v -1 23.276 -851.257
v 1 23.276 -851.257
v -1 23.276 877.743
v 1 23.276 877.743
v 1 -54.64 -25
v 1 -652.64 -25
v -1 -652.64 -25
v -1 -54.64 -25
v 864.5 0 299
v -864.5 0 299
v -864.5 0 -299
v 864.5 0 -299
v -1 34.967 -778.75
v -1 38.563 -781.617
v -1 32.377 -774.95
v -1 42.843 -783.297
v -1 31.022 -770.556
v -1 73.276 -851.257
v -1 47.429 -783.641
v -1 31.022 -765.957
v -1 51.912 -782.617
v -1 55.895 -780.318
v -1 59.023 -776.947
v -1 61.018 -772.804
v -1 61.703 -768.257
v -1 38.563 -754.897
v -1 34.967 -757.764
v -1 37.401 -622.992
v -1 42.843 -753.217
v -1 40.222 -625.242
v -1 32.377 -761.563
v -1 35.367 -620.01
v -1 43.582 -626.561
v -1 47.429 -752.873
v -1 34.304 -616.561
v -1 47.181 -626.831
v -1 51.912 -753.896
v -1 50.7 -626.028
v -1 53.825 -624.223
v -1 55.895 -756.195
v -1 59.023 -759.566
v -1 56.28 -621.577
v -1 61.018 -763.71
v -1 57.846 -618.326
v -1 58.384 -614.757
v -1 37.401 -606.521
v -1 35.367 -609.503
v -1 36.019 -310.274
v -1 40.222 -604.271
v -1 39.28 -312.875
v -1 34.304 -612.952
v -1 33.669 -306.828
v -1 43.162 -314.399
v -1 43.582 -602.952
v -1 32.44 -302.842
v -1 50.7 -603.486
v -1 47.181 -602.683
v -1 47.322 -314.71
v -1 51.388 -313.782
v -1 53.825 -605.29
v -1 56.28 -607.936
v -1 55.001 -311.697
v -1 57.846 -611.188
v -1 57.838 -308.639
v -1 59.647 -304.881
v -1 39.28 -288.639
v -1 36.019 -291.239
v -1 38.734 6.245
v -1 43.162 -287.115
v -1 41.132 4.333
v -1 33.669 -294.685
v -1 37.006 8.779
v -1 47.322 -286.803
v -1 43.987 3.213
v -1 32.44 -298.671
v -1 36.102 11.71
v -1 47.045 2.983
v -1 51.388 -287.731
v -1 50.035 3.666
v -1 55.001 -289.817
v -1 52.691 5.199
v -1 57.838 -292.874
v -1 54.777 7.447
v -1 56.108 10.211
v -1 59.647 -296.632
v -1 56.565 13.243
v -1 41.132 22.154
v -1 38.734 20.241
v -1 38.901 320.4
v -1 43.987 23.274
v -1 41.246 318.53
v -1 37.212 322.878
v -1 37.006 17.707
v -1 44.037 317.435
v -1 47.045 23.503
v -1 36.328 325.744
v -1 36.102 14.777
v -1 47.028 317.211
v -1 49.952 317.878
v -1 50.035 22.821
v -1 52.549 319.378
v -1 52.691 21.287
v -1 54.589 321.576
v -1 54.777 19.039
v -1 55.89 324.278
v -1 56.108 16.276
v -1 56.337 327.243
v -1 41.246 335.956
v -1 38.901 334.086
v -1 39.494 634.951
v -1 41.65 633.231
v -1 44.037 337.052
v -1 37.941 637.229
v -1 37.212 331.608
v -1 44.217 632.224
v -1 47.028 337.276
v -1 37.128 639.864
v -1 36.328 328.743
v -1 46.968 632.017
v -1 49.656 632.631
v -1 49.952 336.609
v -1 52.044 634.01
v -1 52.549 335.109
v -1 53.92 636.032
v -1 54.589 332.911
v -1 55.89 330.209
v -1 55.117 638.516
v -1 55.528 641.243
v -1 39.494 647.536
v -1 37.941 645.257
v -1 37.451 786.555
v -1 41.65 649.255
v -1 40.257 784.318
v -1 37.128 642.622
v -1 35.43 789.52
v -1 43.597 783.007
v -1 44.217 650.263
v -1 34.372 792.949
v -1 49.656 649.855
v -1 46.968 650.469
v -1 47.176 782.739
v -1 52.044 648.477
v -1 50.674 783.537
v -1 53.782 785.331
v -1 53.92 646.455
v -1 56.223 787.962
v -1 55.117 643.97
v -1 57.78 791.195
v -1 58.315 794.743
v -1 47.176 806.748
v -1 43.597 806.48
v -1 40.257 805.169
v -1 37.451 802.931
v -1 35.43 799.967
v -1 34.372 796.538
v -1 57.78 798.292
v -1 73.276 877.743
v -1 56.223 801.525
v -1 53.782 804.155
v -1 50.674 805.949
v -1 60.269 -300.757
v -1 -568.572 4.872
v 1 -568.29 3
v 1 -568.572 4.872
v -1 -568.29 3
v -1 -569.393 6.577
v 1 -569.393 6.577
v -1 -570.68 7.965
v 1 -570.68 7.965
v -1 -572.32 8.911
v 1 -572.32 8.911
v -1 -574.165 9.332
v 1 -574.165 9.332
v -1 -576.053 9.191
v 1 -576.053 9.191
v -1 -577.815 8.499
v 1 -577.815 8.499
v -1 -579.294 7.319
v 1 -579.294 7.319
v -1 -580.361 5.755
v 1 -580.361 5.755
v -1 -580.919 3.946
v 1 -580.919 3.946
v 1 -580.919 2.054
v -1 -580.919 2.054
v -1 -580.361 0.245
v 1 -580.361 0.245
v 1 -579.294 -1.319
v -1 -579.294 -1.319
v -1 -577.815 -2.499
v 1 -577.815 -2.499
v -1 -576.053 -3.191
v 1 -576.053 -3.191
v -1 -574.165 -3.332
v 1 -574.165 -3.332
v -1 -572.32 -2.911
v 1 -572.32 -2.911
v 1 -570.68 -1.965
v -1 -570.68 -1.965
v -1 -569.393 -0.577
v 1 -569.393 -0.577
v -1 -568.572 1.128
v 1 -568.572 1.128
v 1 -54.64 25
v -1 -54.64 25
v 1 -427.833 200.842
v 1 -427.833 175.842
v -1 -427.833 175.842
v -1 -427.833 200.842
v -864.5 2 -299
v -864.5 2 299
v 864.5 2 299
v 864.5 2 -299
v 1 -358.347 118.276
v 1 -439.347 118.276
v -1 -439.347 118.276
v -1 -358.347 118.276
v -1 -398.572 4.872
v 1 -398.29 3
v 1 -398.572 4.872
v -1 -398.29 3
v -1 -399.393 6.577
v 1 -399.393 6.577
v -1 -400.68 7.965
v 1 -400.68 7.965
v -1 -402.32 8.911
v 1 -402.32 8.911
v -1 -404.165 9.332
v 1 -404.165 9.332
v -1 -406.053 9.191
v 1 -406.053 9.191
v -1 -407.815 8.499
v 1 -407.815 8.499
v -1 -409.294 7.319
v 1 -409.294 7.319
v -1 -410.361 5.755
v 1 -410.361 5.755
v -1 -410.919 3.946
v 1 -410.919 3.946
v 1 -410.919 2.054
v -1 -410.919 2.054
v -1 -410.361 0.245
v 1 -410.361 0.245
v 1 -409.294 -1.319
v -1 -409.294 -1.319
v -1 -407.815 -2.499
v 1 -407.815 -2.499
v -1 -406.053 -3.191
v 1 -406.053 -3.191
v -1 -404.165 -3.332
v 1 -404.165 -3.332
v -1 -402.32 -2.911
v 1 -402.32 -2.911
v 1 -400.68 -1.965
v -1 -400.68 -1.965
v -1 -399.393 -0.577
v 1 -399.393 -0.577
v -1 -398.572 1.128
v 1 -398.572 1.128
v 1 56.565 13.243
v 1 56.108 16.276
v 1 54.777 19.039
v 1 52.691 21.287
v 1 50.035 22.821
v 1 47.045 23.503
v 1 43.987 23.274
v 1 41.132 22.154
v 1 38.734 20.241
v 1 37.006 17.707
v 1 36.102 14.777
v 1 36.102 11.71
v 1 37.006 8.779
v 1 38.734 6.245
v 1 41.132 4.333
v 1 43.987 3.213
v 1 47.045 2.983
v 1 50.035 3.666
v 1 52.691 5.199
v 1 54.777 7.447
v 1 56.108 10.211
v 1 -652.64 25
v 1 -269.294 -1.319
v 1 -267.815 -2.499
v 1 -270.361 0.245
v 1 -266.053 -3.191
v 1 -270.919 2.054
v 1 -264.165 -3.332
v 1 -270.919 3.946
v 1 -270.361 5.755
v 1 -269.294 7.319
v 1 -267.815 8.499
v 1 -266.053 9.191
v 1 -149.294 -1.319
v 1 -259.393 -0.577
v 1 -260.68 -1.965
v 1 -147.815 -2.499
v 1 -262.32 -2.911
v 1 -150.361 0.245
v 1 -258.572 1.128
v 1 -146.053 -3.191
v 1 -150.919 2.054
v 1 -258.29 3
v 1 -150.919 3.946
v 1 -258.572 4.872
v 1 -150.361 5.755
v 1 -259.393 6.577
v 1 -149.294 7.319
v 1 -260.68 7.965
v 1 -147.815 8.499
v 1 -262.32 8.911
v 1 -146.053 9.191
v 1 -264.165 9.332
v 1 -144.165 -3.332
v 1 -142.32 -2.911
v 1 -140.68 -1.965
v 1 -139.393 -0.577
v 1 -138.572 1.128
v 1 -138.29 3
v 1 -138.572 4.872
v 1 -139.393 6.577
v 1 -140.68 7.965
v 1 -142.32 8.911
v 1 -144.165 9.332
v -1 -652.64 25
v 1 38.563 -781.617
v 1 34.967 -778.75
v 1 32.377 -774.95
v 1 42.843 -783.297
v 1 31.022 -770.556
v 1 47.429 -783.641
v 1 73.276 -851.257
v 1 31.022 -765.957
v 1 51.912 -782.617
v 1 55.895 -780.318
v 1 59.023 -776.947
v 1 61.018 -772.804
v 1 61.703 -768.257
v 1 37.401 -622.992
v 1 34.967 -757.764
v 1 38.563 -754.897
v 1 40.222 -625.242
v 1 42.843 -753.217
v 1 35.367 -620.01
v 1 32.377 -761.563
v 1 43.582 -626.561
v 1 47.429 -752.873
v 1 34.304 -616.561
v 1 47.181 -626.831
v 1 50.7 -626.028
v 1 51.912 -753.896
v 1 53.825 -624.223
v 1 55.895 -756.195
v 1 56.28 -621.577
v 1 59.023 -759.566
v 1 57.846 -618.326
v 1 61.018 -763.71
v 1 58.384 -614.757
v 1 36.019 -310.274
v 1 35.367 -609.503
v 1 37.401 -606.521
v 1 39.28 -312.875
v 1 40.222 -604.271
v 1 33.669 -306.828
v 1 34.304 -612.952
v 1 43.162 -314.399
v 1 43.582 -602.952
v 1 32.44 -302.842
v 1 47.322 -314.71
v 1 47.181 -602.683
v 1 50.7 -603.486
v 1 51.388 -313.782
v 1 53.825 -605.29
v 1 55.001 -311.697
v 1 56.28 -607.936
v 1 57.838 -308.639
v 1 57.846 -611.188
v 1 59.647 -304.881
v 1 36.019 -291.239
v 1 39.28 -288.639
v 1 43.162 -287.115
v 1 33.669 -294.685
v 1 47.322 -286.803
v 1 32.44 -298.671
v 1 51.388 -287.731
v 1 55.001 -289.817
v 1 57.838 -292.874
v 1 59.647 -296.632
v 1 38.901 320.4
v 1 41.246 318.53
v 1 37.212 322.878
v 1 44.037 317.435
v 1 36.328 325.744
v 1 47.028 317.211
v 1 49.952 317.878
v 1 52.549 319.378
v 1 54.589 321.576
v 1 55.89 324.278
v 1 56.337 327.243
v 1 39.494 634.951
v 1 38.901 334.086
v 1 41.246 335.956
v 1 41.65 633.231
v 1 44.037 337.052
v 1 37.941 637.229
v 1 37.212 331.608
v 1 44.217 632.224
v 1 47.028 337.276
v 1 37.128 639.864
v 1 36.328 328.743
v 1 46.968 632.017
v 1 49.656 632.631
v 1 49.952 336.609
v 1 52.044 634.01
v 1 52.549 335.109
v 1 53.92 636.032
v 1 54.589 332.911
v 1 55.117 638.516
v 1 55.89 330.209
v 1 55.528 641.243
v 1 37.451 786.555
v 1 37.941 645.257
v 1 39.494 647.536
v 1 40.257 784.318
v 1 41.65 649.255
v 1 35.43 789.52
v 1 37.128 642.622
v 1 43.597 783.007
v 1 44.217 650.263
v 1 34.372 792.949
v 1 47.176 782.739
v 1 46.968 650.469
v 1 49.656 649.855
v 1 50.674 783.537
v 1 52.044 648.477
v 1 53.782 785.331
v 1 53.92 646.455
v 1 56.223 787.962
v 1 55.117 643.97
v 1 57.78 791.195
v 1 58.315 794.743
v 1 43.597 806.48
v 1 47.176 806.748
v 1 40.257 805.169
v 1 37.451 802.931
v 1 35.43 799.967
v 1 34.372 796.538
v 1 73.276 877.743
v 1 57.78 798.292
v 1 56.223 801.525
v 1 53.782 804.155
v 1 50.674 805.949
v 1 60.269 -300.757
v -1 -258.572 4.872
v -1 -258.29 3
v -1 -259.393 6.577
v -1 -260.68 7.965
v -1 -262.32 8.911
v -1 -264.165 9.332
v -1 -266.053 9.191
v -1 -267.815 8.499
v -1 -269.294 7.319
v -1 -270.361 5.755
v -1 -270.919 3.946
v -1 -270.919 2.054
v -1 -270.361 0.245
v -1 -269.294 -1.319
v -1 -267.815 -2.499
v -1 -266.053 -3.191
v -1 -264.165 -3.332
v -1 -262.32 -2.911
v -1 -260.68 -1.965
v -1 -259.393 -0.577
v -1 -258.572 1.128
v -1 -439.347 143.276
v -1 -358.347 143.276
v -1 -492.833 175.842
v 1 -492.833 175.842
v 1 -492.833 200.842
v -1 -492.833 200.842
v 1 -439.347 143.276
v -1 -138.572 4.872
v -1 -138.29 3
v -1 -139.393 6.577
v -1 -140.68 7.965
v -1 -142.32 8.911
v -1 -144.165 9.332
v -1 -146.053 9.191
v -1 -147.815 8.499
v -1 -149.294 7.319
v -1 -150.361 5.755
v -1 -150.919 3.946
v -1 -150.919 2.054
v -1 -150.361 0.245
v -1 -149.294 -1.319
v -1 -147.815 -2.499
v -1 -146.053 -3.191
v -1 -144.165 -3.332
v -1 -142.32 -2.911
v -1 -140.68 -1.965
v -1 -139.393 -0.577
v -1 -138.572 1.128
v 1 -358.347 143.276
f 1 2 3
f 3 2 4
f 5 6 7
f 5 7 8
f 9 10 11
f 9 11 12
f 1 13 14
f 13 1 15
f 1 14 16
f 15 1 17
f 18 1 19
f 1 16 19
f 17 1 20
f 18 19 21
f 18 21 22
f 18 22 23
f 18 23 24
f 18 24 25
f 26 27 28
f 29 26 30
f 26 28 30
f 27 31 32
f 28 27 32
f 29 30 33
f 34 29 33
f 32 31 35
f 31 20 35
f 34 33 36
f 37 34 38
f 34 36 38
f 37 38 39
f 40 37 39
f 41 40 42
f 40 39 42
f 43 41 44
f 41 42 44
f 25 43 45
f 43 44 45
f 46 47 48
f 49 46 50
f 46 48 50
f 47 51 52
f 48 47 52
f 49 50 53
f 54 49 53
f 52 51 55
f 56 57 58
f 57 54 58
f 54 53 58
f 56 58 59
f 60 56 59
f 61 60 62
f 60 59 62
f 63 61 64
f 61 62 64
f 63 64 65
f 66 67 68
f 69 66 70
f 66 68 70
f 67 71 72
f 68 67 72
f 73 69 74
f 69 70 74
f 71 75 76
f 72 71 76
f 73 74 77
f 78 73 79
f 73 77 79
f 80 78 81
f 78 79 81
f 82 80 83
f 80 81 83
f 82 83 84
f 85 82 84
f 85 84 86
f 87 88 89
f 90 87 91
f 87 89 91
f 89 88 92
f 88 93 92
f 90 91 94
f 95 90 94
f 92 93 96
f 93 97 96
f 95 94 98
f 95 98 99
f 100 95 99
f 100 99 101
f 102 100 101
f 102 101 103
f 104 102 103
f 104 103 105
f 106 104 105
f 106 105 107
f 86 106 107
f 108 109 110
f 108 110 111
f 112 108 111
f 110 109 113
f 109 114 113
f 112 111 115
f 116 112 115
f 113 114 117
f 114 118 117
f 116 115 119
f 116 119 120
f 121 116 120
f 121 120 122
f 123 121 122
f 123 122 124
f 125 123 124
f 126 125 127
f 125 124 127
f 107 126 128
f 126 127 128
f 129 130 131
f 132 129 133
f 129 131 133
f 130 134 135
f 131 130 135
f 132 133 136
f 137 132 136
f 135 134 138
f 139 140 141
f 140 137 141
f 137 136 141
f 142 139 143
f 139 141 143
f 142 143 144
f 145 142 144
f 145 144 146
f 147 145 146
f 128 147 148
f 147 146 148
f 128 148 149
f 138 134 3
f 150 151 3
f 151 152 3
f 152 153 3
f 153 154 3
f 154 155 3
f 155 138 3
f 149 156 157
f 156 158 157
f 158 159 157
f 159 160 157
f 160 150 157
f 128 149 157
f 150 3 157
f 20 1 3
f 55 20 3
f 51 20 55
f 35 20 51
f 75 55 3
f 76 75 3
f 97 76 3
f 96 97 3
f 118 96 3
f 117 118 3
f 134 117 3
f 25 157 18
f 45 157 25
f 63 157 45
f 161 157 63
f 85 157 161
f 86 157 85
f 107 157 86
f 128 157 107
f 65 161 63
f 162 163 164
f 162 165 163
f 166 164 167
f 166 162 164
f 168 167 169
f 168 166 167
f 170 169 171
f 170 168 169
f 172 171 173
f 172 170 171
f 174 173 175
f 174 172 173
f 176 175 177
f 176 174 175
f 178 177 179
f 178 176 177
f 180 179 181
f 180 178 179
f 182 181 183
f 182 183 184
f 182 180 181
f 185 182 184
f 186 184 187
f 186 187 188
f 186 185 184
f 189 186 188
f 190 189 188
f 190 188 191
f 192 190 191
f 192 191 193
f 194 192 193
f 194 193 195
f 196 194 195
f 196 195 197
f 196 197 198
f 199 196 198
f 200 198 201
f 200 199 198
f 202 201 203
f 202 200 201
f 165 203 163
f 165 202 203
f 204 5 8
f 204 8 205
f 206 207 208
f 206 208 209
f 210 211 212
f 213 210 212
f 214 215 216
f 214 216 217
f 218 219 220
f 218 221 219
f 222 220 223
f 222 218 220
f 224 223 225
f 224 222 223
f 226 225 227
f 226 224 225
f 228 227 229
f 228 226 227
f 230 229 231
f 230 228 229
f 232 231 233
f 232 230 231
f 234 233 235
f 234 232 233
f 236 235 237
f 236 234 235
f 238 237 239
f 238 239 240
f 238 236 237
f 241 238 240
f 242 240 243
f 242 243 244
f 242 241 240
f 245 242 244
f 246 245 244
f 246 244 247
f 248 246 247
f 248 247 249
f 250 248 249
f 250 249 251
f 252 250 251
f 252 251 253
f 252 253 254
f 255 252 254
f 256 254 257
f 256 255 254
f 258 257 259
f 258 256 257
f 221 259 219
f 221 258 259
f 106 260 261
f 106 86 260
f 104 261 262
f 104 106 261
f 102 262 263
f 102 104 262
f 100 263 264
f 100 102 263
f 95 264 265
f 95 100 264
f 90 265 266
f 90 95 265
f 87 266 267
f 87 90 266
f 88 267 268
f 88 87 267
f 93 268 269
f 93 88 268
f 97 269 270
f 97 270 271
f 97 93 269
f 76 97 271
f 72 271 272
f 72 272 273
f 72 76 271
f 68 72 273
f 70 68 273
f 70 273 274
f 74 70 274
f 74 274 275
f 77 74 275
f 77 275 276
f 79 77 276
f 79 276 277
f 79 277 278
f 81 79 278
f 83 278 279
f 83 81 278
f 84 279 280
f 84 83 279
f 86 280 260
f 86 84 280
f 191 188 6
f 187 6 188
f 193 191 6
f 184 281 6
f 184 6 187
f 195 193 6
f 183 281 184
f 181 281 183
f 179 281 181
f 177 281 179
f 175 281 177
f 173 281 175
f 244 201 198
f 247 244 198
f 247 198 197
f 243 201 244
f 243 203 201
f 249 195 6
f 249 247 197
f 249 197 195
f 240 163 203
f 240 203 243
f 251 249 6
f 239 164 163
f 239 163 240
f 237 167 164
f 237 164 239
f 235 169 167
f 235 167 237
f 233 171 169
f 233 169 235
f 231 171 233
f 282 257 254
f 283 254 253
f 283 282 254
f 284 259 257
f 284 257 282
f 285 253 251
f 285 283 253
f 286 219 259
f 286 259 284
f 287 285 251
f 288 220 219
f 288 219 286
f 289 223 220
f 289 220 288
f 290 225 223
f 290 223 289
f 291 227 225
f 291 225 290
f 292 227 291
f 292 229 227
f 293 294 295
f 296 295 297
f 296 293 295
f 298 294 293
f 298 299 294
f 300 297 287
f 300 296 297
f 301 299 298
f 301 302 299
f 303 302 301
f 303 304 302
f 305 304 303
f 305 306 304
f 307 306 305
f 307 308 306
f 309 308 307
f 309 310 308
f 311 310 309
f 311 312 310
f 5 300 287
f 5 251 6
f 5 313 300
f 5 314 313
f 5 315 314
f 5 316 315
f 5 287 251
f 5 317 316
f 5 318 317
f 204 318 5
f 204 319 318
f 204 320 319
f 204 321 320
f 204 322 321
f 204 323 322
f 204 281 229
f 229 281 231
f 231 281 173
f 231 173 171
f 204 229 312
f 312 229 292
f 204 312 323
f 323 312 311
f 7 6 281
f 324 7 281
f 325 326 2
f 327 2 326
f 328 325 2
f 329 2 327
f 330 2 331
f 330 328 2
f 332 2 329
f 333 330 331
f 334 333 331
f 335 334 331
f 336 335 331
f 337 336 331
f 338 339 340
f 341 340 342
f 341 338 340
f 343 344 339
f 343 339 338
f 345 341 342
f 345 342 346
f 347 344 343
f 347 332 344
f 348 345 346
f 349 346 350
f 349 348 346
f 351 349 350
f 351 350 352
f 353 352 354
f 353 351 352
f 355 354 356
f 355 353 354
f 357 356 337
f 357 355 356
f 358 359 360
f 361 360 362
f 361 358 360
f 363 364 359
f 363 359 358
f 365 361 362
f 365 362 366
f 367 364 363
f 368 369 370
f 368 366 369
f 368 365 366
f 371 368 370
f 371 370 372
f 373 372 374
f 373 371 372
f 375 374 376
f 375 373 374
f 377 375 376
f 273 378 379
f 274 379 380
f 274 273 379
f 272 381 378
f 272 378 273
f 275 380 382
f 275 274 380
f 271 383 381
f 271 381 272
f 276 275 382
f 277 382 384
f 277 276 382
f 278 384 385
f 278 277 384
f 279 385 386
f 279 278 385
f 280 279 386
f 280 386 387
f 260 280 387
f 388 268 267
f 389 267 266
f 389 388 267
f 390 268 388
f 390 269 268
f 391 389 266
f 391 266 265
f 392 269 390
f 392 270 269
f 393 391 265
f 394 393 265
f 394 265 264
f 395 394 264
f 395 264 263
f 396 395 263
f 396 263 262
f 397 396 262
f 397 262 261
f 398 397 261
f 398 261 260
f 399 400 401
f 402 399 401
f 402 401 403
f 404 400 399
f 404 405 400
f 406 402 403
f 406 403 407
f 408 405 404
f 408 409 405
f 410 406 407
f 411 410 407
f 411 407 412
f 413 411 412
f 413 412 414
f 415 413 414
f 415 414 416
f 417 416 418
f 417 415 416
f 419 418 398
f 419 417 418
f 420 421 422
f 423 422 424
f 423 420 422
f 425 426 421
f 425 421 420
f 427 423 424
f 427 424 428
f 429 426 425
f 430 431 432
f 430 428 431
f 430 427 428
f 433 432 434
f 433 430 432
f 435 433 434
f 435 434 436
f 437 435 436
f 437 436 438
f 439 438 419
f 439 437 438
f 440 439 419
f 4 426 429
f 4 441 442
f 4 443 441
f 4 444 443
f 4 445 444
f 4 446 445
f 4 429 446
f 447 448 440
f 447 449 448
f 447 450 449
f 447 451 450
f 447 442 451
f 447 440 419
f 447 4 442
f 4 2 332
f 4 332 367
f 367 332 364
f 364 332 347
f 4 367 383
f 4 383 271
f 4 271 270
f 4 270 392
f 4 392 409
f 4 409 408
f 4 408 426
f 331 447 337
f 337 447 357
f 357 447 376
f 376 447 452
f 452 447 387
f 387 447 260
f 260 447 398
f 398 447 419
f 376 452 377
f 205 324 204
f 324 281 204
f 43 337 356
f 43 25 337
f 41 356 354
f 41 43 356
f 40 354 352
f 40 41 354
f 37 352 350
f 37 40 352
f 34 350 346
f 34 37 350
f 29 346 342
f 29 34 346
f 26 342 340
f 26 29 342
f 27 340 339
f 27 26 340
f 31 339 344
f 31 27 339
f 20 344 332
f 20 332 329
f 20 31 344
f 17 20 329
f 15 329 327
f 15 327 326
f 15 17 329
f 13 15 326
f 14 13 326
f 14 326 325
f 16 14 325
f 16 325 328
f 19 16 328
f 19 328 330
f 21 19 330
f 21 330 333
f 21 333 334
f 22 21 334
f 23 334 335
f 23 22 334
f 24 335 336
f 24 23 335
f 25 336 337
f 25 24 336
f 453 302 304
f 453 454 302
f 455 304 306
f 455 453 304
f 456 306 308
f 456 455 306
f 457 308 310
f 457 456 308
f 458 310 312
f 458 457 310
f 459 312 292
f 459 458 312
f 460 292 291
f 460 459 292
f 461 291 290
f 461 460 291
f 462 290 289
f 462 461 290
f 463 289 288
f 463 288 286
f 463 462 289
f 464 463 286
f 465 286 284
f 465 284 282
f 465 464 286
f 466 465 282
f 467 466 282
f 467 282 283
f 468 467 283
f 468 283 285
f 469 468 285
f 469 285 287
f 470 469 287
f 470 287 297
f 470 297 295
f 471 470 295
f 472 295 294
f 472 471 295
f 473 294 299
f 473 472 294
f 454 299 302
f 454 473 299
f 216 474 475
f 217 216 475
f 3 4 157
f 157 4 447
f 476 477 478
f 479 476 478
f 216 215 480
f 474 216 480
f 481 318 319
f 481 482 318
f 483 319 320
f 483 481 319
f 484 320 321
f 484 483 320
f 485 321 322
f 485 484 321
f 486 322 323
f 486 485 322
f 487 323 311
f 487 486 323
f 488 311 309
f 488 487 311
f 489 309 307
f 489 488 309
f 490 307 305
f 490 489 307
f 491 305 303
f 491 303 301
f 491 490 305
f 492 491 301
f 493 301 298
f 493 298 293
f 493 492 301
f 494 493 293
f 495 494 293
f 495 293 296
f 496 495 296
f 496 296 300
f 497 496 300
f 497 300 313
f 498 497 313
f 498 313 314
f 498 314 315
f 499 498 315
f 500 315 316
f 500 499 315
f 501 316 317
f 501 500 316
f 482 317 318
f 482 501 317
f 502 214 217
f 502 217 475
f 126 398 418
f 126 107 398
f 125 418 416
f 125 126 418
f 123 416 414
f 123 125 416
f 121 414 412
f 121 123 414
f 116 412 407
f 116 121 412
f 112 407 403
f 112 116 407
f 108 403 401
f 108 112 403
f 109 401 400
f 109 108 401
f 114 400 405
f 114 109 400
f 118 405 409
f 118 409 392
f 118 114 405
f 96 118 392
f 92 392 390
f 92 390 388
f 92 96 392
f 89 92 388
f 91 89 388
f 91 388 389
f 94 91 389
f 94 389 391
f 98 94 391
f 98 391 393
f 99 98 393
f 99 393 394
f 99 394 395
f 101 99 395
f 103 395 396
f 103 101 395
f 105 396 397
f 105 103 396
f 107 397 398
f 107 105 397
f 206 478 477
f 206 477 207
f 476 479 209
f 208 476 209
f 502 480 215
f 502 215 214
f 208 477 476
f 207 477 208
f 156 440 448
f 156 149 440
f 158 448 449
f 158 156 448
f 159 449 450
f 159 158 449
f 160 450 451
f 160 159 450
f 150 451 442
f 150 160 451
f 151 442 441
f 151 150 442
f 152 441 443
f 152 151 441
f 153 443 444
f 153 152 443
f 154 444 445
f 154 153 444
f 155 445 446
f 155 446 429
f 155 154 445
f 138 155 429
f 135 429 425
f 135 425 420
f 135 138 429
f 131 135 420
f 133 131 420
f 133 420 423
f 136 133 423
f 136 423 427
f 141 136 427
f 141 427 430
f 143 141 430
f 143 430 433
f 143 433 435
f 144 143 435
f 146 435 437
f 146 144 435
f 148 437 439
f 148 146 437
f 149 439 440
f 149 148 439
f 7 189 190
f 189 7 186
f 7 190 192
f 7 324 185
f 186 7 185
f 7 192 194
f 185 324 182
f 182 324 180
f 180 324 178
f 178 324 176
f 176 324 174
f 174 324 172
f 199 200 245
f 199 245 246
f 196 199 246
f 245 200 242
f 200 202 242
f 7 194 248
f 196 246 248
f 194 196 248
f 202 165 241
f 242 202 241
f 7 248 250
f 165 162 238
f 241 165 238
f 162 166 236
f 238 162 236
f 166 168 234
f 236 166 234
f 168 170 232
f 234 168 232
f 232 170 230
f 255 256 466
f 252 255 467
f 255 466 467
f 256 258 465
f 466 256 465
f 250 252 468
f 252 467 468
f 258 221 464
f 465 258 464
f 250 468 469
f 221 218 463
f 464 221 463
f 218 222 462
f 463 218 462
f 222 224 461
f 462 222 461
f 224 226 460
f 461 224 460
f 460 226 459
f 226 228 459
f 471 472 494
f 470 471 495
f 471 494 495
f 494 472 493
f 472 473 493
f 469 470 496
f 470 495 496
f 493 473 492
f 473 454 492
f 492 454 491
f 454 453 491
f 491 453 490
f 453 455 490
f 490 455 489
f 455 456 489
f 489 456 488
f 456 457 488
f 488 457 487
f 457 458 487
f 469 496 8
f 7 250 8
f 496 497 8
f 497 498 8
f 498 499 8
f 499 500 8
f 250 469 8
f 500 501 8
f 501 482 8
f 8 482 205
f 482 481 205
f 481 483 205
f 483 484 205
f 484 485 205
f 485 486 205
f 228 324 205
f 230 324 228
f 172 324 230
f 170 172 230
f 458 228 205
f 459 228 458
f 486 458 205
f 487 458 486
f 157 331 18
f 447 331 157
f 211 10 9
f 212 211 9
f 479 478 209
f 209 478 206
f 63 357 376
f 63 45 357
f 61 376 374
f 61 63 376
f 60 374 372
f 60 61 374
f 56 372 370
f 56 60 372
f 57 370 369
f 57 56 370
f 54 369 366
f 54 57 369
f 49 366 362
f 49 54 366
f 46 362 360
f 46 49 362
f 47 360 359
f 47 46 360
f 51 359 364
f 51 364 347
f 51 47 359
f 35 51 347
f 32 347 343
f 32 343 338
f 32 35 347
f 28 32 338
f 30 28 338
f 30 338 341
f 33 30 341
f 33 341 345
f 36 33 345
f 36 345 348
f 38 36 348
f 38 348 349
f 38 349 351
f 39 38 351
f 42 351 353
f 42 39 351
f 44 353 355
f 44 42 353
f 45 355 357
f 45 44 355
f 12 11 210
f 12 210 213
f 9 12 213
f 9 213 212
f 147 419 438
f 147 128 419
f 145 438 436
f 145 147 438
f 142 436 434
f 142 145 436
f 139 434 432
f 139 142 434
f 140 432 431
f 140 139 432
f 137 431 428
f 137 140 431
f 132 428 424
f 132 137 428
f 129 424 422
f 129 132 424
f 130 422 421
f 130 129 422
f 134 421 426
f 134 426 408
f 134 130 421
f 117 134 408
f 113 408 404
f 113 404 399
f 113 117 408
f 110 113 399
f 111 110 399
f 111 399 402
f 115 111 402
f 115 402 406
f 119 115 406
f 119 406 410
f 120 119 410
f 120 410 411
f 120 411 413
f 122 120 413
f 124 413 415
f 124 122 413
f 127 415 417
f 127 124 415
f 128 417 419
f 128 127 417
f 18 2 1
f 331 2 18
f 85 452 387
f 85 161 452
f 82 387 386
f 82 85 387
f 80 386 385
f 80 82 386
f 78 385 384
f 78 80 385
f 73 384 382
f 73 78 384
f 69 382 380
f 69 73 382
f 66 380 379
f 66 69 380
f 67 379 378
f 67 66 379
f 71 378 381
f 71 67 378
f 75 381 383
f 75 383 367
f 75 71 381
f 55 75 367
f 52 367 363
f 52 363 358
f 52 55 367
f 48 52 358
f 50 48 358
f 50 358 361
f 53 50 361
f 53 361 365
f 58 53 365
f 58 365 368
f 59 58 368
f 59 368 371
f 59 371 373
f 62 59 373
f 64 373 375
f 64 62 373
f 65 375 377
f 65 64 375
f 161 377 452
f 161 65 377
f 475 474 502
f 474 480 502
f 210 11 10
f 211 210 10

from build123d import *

# Parameters (mm, degrees)
F0_W     = 1729
F0_H     = 598
F1_DEPTH = 2
F2_W     = 598
F2_H     = 50
F2_R     = 6.35
F3_DEPTH = 1
F4_W     = 50
F4_H     = 1729
F4_R     = 15.426933
F4_R_2   = 12.107831
F4_R_3   = 13.992805
F4_R_4   = 10.288674
F4_R_5   = 10.060686
F4_R_6   = 9.251667
F4_R_7   = 12.038328
F5_DEPTH = 1
F6_W     = 65
F6_H     = 25
F7_DEPTH = 1
F8_W     = 81
F8_H     = 25
F9_DEPTH = 1


with BuildPart() as f1:
    # F0 (on Front) → F1 (new body)
    with BuildSketch(Plane.XZ):
        Rectangle(F0_W, F0_H)
    extrude(amount=-F1_DEPTH)


with BuildPart() as f3:
    # F2 (on Right) → F3 (new body, symmetric)
    with BuildSketch(Plane.YZ):
        with Locations((-353.639598, 0)):
            Rectangle(F2_W, F2_H)
        with Locations((-574.639598, 3)):
            Circle(F2_R, mode=Mode.SUBTRACT)
        with Locations((-404.639598, 3)):
            Circle(F2_R, mode=Mode.SUBTRACT)
        with Locations((-264.639598, 3)):
            Circle(F2_R, mode=Mode.SUBTRACT)
        with Locations((-144.639598, 3)):
            Circle(F2_R, mode=Mode.SUBTRACT)
    extrude(amount=F3_DEPTH, both=True)


with BuildPart() as f5:
    # F4 (on Right) → F5 (new body, symmetric)
    with BuildSketch(Plane.YZ):
        with Locations((48.276175, 13.243281)):
            Rectangle(F4_W, F4_H)
        with Locations((46.276175, -768.256719)):
            Circle(F4_R, mode=Mode.SUBTRACT)
        with Locations((46.276175, -614.756719)):
            Circle(F4_R_2, mode=Mode.SUBTRACT)
        with Locations((46.276175, -300.756719)):
            Circle(F4_R_3, mode=Mode.SUBTRACT)
        with Locations((46.276175, 13.243281)):
            Circle(F4_R_4, mode=Mode.SUBTRACT)
        with Locations((46.276175, 327.243281)):
            Circle(F4_R_5, mode=Mode.SUBTRACT)
        with Locations((46.276175, 641.243281)):
            Circle(F4_R_6, mode=Mode.SUBTRACT)
        with Locations((46.276175, 794.743281)):
            Circle(F4_R_7, mode=Mode.SUBTRACT)
    extrude(amount=F5_DEPTH, both=True)


with BuildPart() as f7:
    # F6 (on Right) → F7 (new body, symmetric)
    with BuildSketch(Plane.YZ):
        with Locations((-460.33293, 188.342434)):
            Rectangle(F6_W, F6_H)
    extrude(amount=F7_DEPTH, both=True)


with BuildPart() as f9:
    # F8 (on Right) → F9 (new body, symmetric)
    with BuildSketch(Plane.YZ):
        with Locations((-398.847103, 130.776368)):
            Rectangle(F8_W, F8_H)
    extrude(amount=F9_DEPTH, both=True)


solid = Compound([f1.part, f3.part, f5.part, f7.part, f9.part])
